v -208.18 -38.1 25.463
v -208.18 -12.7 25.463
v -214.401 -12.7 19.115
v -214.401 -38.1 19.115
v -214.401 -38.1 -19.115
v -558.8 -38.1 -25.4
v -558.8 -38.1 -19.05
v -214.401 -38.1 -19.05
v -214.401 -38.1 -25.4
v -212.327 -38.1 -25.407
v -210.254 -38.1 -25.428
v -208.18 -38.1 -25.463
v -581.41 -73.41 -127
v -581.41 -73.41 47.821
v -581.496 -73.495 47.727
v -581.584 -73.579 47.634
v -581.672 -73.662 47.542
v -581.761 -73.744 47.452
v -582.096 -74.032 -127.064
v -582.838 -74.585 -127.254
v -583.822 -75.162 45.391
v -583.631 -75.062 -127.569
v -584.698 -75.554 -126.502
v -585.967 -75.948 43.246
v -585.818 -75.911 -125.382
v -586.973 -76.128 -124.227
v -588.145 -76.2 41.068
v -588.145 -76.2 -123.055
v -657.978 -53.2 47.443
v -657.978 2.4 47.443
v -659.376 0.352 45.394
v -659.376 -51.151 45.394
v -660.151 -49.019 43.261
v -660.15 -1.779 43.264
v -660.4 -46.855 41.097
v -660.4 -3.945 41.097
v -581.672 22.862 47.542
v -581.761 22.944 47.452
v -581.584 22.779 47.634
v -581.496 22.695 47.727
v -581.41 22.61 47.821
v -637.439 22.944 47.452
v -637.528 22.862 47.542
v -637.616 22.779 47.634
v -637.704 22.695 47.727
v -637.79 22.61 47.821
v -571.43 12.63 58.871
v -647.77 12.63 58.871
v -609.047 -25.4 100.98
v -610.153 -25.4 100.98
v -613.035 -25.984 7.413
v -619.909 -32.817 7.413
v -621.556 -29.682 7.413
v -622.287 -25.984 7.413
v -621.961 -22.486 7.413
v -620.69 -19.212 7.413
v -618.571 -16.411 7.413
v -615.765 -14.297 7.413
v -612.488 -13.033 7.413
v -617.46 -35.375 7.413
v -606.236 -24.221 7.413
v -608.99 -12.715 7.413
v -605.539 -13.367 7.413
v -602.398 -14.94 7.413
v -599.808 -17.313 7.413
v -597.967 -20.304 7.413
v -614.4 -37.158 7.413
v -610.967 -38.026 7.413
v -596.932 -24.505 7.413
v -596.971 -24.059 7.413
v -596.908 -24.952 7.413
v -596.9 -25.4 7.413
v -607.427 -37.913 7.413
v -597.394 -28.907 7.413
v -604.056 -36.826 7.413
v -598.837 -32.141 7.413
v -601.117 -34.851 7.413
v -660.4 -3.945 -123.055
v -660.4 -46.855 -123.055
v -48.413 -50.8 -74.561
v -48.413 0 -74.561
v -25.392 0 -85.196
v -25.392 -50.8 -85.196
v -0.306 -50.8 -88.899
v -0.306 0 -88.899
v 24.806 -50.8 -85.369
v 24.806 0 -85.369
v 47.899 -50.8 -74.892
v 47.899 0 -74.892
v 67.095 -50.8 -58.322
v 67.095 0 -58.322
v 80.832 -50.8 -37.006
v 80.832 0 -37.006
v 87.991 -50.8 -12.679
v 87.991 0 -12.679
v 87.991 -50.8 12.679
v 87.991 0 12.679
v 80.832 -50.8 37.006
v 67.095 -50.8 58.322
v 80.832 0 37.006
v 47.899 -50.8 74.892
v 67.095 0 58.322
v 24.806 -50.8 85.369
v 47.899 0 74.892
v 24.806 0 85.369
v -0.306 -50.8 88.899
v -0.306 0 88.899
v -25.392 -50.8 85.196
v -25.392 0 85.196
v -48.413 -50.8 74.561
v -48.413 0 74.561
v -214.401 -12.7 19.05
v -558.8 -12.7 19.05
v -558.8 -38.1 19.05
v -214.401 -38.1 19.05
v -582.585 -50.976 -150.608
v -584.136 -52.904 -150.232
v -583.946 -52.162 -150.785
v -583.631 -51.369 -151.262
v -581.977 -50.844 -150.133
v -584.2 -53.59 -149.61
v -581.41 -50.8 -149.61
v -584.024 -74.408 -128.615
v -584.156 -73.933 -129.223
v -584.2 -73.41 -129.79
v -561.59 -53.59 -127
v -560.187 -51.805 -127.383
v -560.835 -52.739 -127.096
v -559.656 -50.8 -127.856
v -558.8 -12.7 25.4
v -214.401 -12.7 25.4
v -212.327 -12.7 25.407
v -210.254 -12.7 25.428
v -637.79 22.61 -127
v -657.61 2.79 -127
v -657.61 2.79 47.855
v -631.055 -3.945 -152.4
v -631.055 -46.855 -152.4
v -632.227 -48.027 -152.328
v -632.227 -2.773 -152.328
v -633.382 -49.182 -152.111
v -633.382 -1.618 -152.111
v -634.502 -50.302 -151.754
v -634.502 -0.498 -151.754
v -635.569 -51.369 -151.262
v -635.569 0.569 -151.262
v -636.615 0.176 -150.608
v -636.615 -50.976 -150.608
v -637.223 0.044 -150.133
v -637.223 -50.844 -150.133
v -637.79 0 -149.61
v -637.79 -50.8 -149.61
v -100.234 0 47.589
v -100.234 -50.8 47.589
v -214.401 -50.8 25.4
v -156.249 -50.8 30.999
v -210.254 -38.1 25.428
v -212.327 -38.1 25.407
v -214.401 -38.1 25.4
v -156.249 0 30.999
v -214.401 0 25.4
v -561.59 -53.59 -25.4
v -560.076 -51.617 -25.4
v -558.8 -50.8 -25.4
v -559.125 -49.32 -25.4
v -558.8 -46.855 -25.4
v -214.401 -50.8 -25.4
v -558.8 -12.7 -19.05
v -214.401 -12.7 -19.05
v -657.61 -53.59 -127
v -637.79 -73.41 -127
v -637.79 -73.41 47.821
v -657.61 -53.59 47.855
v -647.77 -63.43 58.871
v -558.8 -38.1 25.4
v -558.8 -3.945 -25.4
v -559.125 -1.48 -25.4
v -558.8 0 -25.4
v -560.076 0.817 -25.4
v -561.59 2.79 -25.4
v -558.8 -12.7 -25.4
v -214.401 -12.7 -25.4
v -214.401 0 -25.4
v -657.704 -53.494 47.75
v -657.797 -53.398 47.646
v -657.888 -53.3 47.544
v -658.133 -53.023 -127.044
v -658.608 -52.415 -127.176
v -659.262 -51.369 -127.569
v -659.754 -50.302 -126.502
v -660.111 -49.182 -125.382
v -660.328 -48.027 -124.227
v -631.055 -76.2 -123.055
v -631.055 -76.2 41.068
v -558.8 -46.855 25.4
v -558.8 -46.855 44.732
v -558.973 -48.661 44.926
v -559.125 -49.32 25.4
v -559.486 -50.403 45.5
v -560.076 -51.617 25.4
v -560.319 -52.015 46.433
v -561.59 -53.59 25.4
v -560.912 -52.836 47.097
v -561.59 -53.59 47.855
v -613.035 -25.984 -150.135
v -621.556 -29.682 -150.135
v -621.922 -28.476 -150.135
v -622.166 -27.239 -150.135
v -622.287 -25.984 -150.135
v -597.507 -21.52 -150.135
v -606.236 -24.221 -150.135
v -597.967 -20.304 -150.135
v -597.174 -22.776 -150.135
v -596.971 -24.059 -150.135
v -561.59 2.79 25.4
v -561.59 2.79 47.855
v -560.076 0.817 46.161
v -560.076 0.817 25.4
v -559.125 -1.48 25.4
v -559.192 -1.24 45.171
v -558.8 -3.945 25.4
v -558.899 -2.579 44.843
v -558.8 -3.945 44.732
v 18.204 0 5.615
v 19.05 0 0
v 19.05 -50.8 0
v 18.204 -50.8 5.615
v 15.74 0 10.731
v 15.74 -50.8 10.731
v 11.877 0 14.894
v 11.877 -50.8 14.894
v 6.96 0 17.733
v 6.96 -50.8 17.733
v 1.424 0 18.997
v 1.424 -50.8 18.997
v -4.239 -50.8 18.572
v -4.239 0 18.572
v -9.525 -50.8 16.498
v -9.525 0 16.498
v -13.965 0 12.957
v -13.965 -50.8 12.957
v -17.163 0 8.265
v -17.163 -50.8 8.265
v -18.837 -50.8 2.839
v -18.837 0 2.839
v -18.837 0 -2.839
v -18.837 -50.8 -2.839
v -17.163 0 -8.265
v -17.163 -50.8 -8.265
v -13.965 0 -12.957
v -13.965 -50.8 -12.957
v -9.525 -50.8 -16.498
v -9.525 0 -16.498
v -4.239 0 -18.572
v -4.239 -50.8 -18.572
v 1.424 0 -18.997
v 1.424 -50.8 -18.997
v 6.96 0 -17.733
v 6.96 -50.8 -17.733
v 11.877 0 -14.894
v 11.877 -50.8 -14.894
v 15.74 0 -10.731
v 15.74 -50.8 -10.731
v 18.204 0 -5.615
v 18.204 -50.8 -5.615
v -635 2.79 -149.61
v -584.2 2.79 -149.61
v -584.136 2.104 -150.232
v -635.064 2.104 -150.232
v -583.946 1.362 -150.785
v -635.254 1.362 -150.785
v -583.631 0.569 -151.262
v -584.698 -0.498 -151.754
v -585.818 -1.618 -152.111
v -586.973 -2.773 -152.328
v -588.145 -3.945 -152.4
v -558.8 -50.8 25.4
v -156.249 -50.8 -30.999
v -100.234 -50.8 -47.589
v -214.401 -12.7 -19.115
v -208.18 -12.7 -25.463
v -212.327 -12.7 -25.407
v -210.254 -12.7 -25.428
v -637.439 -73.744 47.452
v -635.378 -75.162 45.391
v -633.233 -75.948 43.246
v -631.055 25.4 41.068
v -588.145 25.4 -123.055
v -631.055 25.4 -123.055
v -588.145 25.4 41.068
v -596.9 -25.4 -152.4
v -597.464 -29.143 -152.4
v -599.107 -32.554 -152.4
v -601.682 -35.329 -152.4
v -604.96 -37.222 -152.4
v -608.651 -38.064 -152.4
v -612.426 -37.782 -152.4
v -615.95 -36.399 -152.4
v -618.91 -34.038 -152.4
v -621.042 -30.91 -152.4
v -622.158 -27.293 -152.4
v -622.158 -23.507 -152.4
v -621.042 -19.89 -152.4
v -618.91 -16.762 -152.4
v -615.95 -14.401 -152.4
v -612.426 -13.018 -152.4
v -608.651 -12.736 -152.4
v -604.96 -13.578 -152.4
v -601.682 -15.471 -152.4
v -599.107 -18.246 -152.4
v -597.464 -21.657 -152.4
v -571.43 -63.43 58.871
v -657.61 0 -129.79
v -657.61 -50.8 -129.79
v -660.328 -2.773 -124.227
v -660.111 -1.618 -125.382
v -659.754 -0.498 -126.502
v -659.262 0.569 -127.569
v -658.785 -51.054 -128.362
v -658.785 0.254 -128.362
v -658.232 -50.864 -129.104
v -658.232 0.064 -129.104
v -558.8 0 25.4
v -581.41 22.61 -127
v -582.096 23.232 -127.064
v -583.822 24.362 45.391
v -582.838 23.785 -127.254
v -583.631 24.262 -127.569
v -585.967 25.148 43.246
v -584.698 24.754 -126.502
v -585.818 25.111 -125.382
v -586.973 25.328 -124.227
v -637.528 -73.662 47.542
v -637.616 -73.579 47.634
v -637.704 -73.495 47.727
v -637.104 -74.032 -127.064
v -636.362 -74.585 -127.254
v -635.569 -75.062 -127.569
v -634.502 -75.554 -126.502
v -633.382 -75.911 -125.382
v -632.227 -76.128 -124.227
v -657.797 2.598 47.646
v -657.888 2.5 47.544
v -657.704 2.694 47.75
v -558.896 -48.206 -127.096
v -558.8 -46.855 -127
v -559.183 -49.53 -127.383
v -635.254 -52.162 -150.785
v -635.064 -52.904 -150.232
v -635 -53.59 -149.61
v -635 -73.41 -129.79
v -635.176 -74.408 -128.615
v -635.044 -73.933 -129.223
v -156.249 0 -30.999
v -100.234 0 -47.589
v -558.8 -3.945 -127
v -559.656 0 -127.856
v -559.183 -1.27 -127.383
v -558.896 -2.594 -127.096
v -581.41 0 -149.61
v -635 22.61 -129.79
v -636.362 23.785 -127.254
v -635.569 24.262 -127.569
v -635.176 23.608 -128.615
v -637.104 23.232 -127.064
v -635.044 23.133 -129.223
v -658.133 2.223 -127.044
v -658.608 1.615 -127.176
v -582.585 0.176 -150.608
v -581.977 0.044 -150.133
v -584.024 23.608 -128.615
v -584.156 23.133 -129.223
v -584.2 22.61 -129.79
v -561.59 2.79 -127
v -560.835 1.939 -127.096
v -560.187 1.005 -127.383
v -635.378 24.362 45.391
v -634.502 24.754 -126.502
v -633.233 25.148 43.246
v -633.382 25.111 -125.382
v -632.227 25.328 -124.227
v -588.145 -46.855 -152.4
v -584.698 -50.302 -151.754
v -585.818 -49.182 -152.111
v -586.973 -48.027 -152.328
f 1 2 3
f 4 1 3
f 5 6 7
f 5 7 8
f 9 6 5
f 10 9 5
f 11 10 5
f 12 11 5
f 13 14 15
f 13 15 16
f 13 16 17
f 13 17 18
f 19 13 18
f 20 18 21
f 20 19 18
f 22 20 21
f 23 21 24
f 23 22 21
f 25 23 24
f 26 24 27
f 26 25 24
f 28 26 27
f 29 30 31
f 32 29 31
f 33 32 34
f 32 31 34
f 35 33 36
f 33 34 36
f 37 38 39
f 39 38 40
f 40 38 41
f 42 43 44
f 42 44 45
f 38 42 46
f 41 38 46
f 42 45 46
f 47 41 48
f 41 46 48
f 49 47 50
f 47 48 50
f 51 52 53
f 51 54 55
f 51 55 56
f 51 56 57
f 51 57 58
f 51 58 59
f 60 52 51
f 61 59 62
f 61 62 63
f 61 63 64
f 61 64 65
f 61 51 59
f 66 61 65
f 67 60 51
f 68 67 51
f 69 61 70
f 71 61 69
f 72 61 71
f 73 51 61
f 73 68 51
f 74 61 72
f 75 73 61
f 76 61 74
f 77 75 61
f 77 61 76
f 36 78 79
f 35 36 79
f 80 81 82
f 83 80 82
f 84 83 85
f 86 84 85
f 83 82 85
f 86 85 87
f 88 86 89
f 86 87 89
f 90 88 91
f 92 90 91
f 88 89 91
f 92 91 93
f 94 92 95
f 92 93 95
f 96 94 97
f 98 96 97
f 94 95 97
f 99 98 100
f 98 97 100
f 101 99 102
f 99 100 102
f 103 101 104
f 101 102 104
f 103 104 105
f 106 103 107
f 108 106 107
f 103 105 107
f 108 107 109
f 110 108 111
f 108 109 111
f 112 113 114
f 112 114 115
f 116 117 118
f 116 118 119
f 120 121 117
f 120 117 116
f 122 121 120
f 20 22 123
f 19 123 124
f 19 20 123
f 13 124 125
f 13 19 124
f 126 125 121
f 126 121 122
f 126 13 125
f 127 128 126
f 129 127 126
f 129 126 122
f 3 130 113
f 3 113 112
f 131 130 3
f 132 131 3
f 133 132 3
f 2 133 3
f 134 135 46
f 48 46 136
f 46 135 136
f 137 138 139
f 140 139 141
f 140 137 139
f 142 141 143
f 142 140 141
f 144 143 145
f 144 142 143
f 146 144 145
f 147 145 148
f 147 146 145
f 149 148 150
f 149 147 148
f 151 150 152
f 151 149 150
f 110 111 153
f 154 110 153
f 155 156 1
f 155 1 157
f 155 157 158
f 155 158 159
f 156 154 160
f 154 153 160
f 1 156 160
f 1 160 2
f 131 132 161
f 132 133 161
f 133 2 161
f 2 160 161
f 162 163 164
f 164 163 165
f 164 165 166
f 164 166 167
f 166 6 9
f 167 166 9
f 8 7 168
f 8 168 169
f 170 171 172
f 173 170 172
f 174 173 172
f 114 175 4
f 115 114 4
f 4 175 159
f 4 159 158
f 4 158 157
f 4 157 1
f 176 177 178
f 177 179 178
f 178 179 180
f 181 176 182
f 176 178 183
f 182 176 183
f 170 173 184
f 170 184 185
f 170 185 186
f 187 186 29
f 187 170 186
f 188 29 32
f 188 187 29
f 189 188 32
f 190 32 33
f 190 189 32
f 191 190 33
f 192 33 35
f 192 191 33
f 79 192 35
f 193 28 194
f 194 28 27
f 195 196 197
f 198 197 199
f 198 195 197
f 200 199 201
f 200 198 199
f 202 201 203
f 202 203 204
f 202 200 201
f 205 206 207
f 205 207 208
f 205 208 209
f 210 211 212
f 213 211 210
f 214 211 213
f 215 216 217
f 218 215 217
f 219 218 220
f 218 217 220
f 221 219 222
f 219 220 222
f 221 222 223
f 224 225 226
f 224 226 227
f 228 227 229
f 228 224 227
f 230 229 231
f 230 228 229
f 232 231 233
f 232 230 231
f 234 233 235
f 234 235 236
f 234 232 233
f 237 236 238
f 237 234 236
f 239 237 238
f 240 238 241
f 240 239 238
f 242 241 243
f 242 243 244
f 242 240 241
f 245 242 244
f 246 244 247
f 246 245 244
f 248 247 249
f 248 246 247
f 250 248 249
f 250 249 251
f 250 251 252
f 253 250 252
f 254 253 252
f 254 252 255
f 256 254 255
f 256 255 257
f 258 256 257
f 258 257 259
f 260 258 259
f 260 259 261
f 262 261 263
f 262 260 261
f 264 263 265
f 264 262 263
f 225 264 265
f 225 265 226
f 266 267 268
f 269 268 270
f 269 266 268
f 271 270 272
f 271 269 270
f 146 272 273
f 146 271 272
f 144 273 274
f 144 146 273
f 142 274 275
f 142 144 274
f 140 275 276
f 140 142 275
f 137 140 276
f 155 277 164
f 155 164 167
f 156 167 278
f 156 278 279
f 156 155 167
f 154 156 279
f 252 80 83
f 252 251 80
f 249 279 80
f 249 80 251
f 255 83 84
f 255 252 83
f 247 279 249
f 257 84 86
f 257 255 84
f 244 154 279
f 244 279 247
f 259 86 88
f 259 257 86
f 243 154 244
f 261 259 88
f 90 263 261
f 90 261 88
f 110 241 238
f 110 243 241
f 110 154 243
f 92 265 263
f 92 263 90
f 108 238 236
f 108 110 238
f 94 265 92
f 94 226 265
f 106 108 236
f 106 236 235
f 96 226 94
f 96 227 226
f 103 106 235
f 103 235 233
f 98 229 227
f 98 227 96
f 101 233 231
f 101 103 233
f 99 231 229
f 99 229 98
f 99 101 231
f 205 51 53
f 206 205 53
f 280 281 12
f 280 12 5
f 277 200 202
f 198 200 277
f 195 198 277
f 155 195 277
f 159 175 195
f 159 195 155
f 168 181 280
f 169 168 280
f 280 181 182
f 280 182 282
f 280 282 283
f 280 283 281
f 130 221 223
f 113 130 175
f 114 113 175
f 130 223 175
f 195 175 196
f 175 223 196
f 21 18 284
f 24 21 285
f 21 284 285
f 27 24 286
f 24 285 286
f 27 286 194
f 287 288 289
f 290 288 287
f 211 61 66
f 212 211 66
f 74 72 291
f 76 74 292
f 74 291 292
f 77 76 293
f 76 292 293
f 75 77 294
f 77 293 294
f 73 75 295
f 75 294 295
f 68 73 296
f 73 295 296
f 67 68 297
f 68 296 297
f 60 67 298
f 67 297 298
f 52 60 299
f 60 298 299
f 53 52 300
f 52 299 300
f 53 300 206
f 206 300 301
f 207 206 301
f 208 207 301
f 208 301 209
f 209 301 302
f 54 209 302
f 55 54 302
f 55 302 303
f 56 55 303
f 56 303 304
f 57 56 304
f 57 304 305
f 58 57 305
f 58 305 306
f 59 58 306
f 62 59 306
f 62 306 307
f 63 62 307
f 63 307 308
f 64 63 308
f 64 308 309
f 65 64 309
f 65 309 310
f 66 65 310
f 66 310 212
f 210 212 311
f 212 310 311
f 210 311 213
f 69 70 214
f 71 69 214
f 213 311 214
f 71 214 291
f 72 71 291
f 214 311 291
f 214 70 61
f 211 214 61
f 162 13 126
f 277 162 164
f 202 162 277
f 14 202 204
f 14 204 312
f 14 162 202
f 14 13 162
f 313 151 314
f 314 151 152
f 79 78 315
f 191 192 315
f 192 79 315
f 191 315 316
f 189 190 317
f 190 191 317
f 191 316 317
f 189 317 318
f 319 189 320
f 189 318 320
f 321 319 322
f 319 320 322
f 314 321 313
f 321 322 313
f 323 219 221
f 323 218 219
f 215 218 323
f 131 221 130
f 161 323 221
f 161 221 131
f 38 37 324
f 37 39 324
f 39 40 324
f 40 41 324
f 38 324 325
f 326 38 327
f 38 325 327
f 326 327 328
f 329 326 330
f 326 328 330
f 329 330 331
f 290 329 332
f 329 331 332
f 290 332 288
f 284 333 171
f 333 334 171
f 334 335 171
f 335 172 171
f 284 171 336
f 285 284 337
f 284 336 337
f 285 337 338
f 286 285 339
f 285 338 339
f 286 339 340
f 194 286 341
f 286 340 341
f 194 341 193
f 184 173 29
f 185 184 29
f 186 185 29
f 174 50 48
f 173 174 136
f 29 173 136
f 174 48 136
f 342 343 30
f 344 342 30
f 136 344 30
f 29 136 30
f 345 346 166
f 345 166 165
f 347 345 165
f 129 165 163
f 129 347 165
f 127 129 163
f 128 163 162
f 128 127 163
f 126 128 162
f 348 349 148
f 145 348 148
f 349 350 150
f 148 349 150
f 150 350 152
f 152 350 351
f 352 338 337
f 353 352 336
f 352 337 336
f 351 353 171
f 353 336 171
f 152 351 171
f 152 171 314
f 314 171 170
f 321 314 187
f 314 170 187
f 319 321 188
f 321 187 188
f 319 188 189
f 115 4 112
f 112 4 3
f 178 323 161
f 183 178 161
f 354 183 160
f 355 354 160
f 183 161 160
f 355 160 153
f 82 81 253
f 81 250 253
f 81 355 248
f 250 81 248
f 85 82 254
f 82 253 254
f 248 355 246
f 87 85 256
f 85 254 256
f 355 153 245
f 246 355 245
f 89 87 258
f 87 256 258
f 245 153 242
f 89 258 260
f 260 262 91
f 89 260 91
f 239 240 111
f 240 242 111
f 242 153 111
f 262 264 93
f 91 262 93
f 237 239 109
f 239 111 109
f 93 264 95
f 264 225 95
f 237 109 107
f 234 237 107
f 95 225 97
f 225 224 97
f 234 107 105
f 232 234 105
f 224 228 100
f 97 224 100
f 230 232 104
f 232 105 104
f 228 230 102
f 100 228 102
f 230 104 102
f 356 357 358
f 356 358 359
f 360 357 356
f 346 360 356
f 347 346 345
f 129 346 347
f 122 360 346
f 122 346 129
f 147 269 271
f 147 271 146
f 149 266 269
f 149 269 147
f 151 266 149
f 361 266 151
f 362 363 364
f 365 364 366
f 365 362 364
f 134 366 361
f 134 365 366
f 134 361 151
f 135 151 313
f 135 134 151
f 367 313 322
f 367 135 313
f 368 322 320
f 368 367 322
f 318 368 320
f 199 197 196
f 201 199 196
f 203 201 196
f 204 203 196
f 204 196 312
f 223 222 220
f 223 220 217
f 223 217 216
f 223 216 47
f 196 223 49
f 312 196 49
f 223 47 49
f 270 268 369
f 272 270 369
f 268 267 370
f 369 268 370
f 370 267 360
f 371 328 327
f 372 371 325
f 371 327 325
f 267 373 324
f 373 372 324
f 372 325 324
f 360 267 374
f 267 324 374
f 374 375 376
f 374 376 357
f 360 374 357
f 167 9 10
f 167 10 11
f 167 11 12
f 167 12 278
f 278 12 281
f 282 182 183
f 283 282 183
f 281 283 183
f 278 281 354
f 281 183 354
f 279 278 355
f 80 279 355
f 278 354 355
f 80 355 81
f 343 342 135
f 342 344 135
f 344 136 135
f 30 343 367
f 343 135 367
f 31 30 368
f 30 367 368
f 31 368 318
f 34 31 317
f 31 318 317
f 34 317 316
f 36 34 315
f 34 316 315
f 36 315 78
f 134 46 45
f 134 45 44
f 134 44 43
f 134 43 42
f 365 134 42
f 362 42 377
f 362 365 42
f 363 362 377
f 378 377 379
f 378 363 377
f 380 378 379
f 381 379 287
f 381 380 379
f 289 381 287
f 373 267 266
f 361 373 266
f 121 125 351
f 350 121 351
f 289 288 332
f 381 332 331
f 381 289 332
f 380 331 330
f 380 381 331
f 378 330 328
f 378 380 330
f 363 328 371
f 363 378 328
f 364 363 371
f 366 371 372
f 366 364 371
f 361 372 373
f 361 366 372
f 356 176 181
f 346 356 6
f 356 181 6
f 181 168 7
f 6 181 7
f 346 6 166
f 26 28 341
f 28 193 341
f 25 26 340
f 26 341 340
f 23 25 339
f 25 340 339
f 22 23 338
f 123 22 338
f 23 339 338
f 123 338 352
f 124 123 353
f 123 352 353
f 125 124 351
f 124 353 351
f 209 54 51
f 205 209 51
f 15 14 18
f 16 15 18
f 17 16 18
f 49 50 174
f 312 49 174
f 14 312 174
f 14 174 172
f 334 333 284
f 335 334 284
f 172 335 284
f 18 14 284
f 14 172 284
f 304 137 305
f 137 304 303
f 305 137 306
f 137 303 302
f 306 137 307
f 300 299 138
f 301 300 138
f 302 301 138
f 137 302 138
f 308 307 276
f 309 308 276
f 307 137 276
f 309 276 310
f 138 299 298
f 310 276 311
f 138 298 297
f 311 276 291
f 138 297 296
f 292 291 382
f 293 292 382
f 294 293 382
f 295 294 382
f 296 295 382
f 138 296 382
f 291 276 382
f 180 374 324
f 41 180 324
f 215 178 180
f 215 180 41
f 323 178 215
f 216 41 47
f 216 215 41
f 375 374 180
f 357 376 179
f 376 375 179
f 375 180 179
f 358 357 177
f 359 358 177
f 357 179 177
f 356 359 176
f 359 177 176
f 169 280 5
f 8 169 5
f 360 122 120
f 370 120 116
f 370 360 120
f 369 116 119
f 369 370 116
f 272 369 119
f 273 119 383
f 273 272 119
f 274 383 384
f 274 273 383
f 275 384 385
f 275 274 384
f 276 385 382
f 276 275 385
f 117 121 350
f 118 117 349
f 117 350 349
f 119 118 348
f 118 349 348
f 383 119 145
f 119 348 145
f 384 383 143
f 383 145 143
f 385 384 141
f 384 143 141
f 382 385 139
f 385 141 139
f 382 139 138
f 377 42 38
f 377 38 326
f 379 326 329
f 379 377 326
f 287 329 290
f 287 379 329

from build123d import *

# Parameters (mm, degrees)
F0_R          = 19.05
F1_DEPTH      = 50.8
F2_W          = 101.6
F2_H          = 254
F3_DEPTH      = 101.6
F5_DEPTH      = 150.00483
F7_DEPTH      = 133.96625
F8_SIZE       = 25.39999
F9_T1_DEPTH   = 70.526940908
F9_T3_DEPTH   = 70.526940908
F10_T1_DEPTH  = 69.1227672529
F10_T3_DEPTH  = 191.4591513789
F10_T5_DEPTH  = 70.526940908
F10_T7_DEPTH  = 68.974059705
F10_T9_DEPTH  = 70.526940908
F11_T4_DEPTH  = 191.4591513789
F11_T9_DEPTH  = 191.4591513789
F11_T14_DEPTH = 191.4591513789
F11_T19_DEPTH = 191.4591513789
F13_R         = 12.7
F14_DEPTH     = 159.81291
F15_W         = 344.3993236951
F15_H         = 25.4
F16_DEPTH     = 6.35
F17_W         = 344.3993236951
F17_H         = 25.4
F18_DEPTH     = 6.35
F19_T1_DEPTH  = 25.4
F21_DEPTH     = 157.5482


# Not quite as in the source:
# - a fillet or chamfer that OpenCascade refuses, or shapes differently, is made with other operations: its cross-section is extruded or revolved along the edge and cut away or added
# - a fillet or chamfer is up to 0.001 mm smaller than in the source, because OpenCascade refuses the exact size
# - a feature of the source that left no trace in its solid (it failed there, or was rolled back) is left out


with BuildPart() as f1:
    # F0 (on Front) → F1 (new body)
    with BuildSketch(Plane.XZ):
        with BuildLine():
            ThreePointArc((-214.4006763049, -25.4), (-127.8432927657, -37.9486366929), (-48.4130559398, -74.5612903226))
            ThreePointArc((-48.4130559398, -74.5612903226), (88.9, 0), (-48.4130559398, 74.5612903226))
            ThreePointArc((-48.4130559398, 74.5612903226), (-127.8432927657, 37.9486366929), (-214.4006763049, 25.4))
            Line((-214.4006763049, 25.4), (-558.8, 25.4))
            Line((-558.8, 25.4), (-558.8, -25.4))
            Line((-558.8, -25.4), (-214.4006763049, -25.4))
        make_face()
        Circle(F0_R, mode=Mode.SUBTRACT)
    extrude(amount=F1_DEPTH)

    # F2 (on face) → F3 (join)
    with BuildSketch(Plane(origin=(-558.8, 0, 0), x_dir=(0, -1, 0), z_dir=(-1, 0, 0))):
        with Locations((25.4, -25.4)):
            Rectangle(F2_W, F2_H)
    extrude(amount=F3_DEPTH)

    # F4 (on face) → F5 (cut)
    with BuildSketch(Plane(origin=(0, 25.4, 0), x_dir=(-1, 0, 0), z_dir=(0, 1, 0))):
        Polygon((534.5858503342, 124.7548833489), (558.8, 44.7322204709), (609.6, 101.6), (660.4, 44.7322204709), (660.4, 124.7548833489), align=None)
    extrude(amount=-F5_DEPTH, mode=Mode.SUBTRACT)

    # F6 (on face) → F7 (cut)
    with BuildSketch(Plane(origin=(-660.4, 0, 0), x_dir=(0, -1, 0), z_dir=(-1, 0, 0))):
        Polygon((-36.009144038, 107.4853688478), (-25.4, 44.7322204709), (25.4, 100.9804829955), (76.2, 44.7322204709), (85.7249945402, 107.4853688478), align=None)
    extrude(amount=-F7_DEPTH, mode=Mode.SUBTRACT)

    # F8 (size 25.4 in the source; OpenCascade refuses exactly that, so slightly less here)
    f8_edges = [f1.edges().sort_by_distance(p)[0] for p in [
        (-660.4, -76.2, -53.83389),
        (-558.8, -76.2, -53.83389),
        (-558.8, 25.4, -53.83389),
        (-660.4, 25.4, -53.83389),
        (-609.6, 25.4, -152.4),
        (-609.6, -76.2, -152.4),
        (-558.8, -25.4, -152.4),
        (-660.4, -25.4, -152.4),
    ]]
    chamfer(f8_edges, length=F8_SIZE)

    # F9: fillet of radius 9.525 on 4 edges, made by hand

    # F9_s2 → F9_t1 (cut)
    with BuildSketch(Plane.YZ.offset(-644.863470454)):
        with BuildLine():
            ThreePointArc((2.7898179092, -149.6101920908), (-0.3003144883, -151.6749525472), (-3.9453741816, -152.4))
            Line((-3.9453741816, -152.4), (1e-05, -152.4))
            Line((1e-05, -152.4), (2.7898179092, -149.6101920908))
        make_face()
        with BuildLine():
            ThreePointArc((-53.5898179092, -149.6101920908), (-50.4996855117, -151.6749525472), (-46.8546258184, -152.4))
            Line((-46.8546258184, -152.4), (-50.80001, -152.4))
            Line((-50.80001, -152.4), (-53.5898179092, -149.6101920908))
        make_face()
    extrude(amount=F9_T1_DEPTH, mode=Mode.SUBTRACT)

    # F9_s4 → F9_t3 (cut)
    with BuildSketch(Plane.XZ.offset(-9.863470454)):
        with BuildLine():
            ThreePointArc((-581.4101820908, -149.6101920908), (-584.5003144883, -151.6749525472), (-588.1453741816, -152.4))
            Line((-588.1453741816, -152.4), (-584.19999, -152.4))
            Line((-584.19999, -152.4), (-581.4101820908, -149.6101920908))
        make_face()
        with BuildLine():
            ThreePointArc((-631.0546258184, -152.4), (-634.6996855117, -151.6749525472), (-637.7898179092, -149.6101920908))
            Line((-637.7898179092, -149.6101920908), (-635.00001, -152.4))
            Line((-635.00001, -152.4), (-631.0546258184, -152.4))
        make_face()
    extrude(amount=F9_T3_DEPTH, mode=Mode.SUBTRACT)

    # F10: fillet of radius 9.525 on 12 edges, made by hand

    # F10_s2 → F10_t1 (cut)
    with BuildSketch(Plane.YZ.offset(-644.1613836265)):
        with BuildLine():
            ThreePointArc((-73.7438328649, 47.4518097193), (-75.5647766574, 44.4878312477), (-76.2, 41.0676710203))
            Line((-76.2, 41.0676710203), (-76.2, 44.7322204709))
            Line((-76.2, 44.7322204709), (-73.7438328649, 47.4518097193))
        make_face()
        with BuildLine():
            ThreePointArc((22.9438328649, 47.4518097193), (24.7647766574, 44.4878312477), (25.4, 41.0676710203))
            Line((25.4, 41.0676710203), (25.4, 44.7322204709))
            Line((25.4, 44.7322204709), (22.9438328649, 47.4518097193))
        make_face()
    extrude(amount=F10_T1_DEPTH, mode=Mode.SUBTRACT)

    # F10_s4 → F10_t3 (cut)
    with BuildSketch(Plane.XY.offset(-136.863470454)):
        with BuildLine():
            ThreePointArc((-637.7898179092, -73.4101920908), (-634.6996855117, -75.4749525472), (-631.0546258184, -76.2))
            Line((-631.0546258184, -76.2), (-635.00001, -76.2))
            Line((-635.00001, -76.2), (-637.7898179092, -73.4101920908))
        make_face()
        with BuildLine():
            ThreePointArc((-581.4101820908, -73.4101920908), (-584.5003144883, -75.4749525472), (-588.1453741816, -76.2))
            Line((-588.1453741816, -76.2), (-584.19999, -76.2))
            Line((-584.19999, -76.2), (-581.4101820908, -73.4101920908))
        make_face()
        with BuildLine():
            ThreePointArc((-637.7898179092, 22.6101920908), (-634.6996855117, 24.6749525472), (-631.0546258184, 25.4))
            Line((-631.0546258184, 25.4), (-635.00001, 25.4))
            Line((-635.00001, 25.4), (-637.7898179092, 22.6101920908))
        make_face()
        with BuildLine():
            ThreePointArc((-581.4101820908, 22.6101920908), (-584.5003144883, 24.6749525472), (-588.1453741816, 25.4))
            Line((-588.1453741816, 25.4), (-584.19999, 25.4))
            Line((-584.19999, 25.4), (-581.4101820908, 22.6101920908))
        make_face()
        with BuildLine():
            ThreePointArc((-657.6101920908, 2.7898179092), (-659.6749525472, -0.3003144883), (-660.4, -3.9453741816))
            Line((-660.4, -3.9453741816), (-660.4, 1e-05))
            Line((-660.4, 1e-05), (-657.6101920908, 2.7898179092))
        make_face()
        with BuildLine():
            ThreePointArc((-657.6101920908, -53.5898179092), (-659.6749525472, -50.4996855117), (-660.4, -46.8546258184))
            Line((-660.4, -46.8546258184), (-660.4, -50.80001))
            Line((-660.4, -50.80001), (-657.6101920908, -53.5898179092))
        make_face()
    extrude(amount=F10_T3_DEPTH, mode=Mode.SUBTRACT)

    # F10_s6 → F10_t5 (cut)
    with BuildSketch(Plane.YZ.offset(-644.863470454)):
        with BuildLine():
            ThreePointArc((-76.2, -123.0546258184), (-75.4749525472, -126.6996855117), (-73.4101920908, -129.7898179092))
            Line((-73.4101920908, -129.7898179092), (-76.2, -127.00001))
            Line((-76.2, -127.00001), (-76.2, -123.0546258184))
        make_face()
        with BuildLine():
            ThreePointArc((25.4, -123.0546258184), (24.6749525472, -126.6996855117), (22.6101920908, -129.7898179092))
            Line((22.6101920908, -129.7898179092), (25.4, -127.00001))
            Line((25.4, -127.00001), (25.4, -123.0546258184))
        make_face()
    extrude(amount=F10_T5_DEPTH, mode=Mode.SUBTRACT)

    # F10_s8 → F10_t7 (cut)
    with BuildSketch(Plane.XZ.offset(-9.0870298525)):
        with BuildLine():
            ThreePointArc((-657.9784923634, 47.4429638254), (-659.7740558421, 44.4933557154), (-660.4, 41.0974125299))
            Line((-660.4, 41.0974125299), (-660.4, 44.7322204709))
            Line((-660.4, 44.7322204709), (-657.9784923634, 47.4429638254))
        make_face()
    extrude(amount=F10_T7_DEPTH, mode=Mode.SUBTRACT)

    # F10_s10 → F10_t9 (cut)
    with BuildSketch(Plane.XZ.offset(-9.863470454)):
        with BuildLine():
            ThreePointArc((-660.4, -123.0546258184), (-659.6749525472, -126.6996855117), (-657.6101920908, -129.7898179092))
            Line((-657.6101920908, -129.7898179092), (-660.4, -127.00001))
            Line((-660.4, -127.00001), (-660.4, -123.0546258184))
        make_face()
    extrude(amount=F10_T9_DEPTH, mode=Mode.SUBTRACT)

    # F11: fillet of radius 9.525 on 2 edges, made by hand


with BuildPart() as f11_tool2:
    # F11_s3 → F11_t4 (new body)
    with BuildSketch(Plane.XY.offset(-136.863470454)):
        with BuildLine():
            ThreePointArc((-558.8, -46.8546258184), (-559.5250474528, -50.4996855117), (-561.5898079092, -53.5898179092))
            Line((-561.5898079092, -53.5898179092), (-558.8, -50.80001))
            Line((-558.8, -50.80001), (-558.8, -46.8546258184))
        make_face()
    extrude(amount=F11_T4_DEPTH)

    split(bisect_by=Plane.XY.offset(-25.4), keep=Keep.BOTTOM)


with BuildPart() as f1_1:
    add(f1.part)

    # F11_t1: cut F11_tool2
    add(f11_tool2.part, mode=Mode.SUBTRACT)


with BuildPart() as f11_tool7:
    # F11_s8 → F11_t9 (new body)
    with BuildSketch(Plane.XY.offset(-136.863470454)):
        with BuildLine():
            ThreePointArc((-558.8, -46.8546258184), (-559.5250474528, -50.4996855117), (-561.5898079092, -53.5898179092))
            Line((-561.5898079092, -53.5898179092), (-558.8, -50.80001))
            Line((-558.8, -50.80001), (-558.8, -46.8546258184))
        make_face()
    extrude(amount=F11_T9_DEPTH)

    split(bisect_by=Plane.XY.offset(25.4), keep=Keep.TOP)


with BuildPart() as f1_2:
    add(f1_1.part)

    # F11_t6: cut F11_tool7
    add(f11_tool7.part, mode=Mode.SUBTRACT)


with BuildPart() as f11_tool12:
    # F11_s13 → F11_t14 (new body)
    with BuildSketch(Plane.XY.offset(54.5956809249)):
        with BuildLine():
            ThreePointArc((-561.5898079092, 2.7898179092), (-559.5250474528, -0.3003144883), (-558.8, -3.9453741816))
            Line((-558.8, -3.9453741816), (-558.8, 1e-05))
            Line((-558.8, 1e-05), (-561.5898079092, 2.7898179092))
        make_face()
    extrude(amount=-F11_T14_DEPTH)

    split(bisect_by=Plane.XY.offset(25.4), keep=Keep.TOP)


with BuildPart() as f1_3:
    add(f1_2.part)

    # F11_t11: cut F11_tool12
    add(f11_tool12.part, mode=Mode.SUBTRACT)


with BuildPart() as f11_tool17:
    # F11_s18 → F11_t19 (new body)
    with BuildSketch(Plane.XY.offset(54.5956809249)):
        with BuildLine():
            ThreePointArc((-561.5898079092, 2.7898179092), (-559.5250474528, -0.3003144883), (-558.8, -3.9453741816))
            Line((-558.8, -3.9453741816), (-558.8, 1e-05))
            Line((-558.8, 1e-05), (-561.5898079092, 2.7898179092))
        make_face()
    extrude(amount=-F11_T19_DEPTH)

    split(bisect_by=Plane.XY.offset(-25.4), keep=Keep.BOTTOM)


with BuildPart() as f1_4:
    add(f1_3.part)

    # F11_t16: cut F11_tool17
    add(f11_tool17.part, mode=Mode.SUBTRACT)

    # F13 (on face) → F14 (cut)
    with BuildSketch(Plane(origin=(0, 0, -152.4), x_dir=(1, 0, 0), z_dir=(0, 0, -1))):
        with Locations((-609.6, 25.4)):
            Circle(F13_R)
    extrude(amount=-F14_DEPTH, mode=Mode.SUBTRACT)

    # F15 (on face) → F16 (cut)
    with BuildSketch(Plane.XY.offset(25.4)):
        with Locations((-386.6003381525, -25.4)):
            Rectangle(F15_W, F15_H)
    extrude(amount=-F16_DEPTH, mode=Mode.SUBTRACT)

    # F17 (on face) → F18 (cut)
    with BuildSketch(Plane(origin=(0, 0, -25.4), x_dir=(1, 0, 0), z_dir=(0, 0, -1))):
        with Locations((-386.6003381525, 25.4)):
            Rectangle(F17_W, F17_H)
    extrude(amount=-F18_DEPTH, mode=Mode.SUBTRACT)

    # F19: chamfer of 6.35 on 6 edges, made by hand

    # F19_s2 → F19_t1 (cut)
    with BuildSketch(Plane.XZ.offset(12.7)):
        with BuildLine():
            Line((-208.1802681416, -25.4634801631), (-214.4006763049, -19.1148026665))
            Line((-214.4006763049, -19.1148026665), (-214.4006763049, -25.4))
            ThreePointArc((-214.4006763049, -25.4), (-211.2004813817, -25.4168004098), (-208.1802681416, -25.4634801631))
        make_face()
        with BuildLine():
            Line((-208.1802681416, 25.4634801631), (-214.4006763049, 19.1148026665))
            Line((-214.4006763049, 19.1148026665), (-214.4006763049, 25.4))
            ThreePointArc((-214.4006763049, 25.4), (-211.2004813817, 25.4168004098), (-208.1802681416, 25.4634801631))
        make_face()
    extrude(amount=F19_T1_DEPTH, mode=Mode.SUBTRACT)

    # F20 (on face) → F21 (join)
    with BuildSketch(Plane(origin=(0, 0, 7.41291), x_dir=(1, 0, 0), z_dir=(0, 0, -1))):
        Polygon((-613.0348443985, 25.984024629), (-626.3800263405, 31.7753516138), (-628.3944249153, 25.984024629), align=None)
        Polygon((-591.8838977814, 23.9696521312), (-606.2363386154, 24.2214500904), (-591.8838977814, 17.4229387194), align=None)
    extrude(amount=F21_DEPTH)


solid = f1_4.part
